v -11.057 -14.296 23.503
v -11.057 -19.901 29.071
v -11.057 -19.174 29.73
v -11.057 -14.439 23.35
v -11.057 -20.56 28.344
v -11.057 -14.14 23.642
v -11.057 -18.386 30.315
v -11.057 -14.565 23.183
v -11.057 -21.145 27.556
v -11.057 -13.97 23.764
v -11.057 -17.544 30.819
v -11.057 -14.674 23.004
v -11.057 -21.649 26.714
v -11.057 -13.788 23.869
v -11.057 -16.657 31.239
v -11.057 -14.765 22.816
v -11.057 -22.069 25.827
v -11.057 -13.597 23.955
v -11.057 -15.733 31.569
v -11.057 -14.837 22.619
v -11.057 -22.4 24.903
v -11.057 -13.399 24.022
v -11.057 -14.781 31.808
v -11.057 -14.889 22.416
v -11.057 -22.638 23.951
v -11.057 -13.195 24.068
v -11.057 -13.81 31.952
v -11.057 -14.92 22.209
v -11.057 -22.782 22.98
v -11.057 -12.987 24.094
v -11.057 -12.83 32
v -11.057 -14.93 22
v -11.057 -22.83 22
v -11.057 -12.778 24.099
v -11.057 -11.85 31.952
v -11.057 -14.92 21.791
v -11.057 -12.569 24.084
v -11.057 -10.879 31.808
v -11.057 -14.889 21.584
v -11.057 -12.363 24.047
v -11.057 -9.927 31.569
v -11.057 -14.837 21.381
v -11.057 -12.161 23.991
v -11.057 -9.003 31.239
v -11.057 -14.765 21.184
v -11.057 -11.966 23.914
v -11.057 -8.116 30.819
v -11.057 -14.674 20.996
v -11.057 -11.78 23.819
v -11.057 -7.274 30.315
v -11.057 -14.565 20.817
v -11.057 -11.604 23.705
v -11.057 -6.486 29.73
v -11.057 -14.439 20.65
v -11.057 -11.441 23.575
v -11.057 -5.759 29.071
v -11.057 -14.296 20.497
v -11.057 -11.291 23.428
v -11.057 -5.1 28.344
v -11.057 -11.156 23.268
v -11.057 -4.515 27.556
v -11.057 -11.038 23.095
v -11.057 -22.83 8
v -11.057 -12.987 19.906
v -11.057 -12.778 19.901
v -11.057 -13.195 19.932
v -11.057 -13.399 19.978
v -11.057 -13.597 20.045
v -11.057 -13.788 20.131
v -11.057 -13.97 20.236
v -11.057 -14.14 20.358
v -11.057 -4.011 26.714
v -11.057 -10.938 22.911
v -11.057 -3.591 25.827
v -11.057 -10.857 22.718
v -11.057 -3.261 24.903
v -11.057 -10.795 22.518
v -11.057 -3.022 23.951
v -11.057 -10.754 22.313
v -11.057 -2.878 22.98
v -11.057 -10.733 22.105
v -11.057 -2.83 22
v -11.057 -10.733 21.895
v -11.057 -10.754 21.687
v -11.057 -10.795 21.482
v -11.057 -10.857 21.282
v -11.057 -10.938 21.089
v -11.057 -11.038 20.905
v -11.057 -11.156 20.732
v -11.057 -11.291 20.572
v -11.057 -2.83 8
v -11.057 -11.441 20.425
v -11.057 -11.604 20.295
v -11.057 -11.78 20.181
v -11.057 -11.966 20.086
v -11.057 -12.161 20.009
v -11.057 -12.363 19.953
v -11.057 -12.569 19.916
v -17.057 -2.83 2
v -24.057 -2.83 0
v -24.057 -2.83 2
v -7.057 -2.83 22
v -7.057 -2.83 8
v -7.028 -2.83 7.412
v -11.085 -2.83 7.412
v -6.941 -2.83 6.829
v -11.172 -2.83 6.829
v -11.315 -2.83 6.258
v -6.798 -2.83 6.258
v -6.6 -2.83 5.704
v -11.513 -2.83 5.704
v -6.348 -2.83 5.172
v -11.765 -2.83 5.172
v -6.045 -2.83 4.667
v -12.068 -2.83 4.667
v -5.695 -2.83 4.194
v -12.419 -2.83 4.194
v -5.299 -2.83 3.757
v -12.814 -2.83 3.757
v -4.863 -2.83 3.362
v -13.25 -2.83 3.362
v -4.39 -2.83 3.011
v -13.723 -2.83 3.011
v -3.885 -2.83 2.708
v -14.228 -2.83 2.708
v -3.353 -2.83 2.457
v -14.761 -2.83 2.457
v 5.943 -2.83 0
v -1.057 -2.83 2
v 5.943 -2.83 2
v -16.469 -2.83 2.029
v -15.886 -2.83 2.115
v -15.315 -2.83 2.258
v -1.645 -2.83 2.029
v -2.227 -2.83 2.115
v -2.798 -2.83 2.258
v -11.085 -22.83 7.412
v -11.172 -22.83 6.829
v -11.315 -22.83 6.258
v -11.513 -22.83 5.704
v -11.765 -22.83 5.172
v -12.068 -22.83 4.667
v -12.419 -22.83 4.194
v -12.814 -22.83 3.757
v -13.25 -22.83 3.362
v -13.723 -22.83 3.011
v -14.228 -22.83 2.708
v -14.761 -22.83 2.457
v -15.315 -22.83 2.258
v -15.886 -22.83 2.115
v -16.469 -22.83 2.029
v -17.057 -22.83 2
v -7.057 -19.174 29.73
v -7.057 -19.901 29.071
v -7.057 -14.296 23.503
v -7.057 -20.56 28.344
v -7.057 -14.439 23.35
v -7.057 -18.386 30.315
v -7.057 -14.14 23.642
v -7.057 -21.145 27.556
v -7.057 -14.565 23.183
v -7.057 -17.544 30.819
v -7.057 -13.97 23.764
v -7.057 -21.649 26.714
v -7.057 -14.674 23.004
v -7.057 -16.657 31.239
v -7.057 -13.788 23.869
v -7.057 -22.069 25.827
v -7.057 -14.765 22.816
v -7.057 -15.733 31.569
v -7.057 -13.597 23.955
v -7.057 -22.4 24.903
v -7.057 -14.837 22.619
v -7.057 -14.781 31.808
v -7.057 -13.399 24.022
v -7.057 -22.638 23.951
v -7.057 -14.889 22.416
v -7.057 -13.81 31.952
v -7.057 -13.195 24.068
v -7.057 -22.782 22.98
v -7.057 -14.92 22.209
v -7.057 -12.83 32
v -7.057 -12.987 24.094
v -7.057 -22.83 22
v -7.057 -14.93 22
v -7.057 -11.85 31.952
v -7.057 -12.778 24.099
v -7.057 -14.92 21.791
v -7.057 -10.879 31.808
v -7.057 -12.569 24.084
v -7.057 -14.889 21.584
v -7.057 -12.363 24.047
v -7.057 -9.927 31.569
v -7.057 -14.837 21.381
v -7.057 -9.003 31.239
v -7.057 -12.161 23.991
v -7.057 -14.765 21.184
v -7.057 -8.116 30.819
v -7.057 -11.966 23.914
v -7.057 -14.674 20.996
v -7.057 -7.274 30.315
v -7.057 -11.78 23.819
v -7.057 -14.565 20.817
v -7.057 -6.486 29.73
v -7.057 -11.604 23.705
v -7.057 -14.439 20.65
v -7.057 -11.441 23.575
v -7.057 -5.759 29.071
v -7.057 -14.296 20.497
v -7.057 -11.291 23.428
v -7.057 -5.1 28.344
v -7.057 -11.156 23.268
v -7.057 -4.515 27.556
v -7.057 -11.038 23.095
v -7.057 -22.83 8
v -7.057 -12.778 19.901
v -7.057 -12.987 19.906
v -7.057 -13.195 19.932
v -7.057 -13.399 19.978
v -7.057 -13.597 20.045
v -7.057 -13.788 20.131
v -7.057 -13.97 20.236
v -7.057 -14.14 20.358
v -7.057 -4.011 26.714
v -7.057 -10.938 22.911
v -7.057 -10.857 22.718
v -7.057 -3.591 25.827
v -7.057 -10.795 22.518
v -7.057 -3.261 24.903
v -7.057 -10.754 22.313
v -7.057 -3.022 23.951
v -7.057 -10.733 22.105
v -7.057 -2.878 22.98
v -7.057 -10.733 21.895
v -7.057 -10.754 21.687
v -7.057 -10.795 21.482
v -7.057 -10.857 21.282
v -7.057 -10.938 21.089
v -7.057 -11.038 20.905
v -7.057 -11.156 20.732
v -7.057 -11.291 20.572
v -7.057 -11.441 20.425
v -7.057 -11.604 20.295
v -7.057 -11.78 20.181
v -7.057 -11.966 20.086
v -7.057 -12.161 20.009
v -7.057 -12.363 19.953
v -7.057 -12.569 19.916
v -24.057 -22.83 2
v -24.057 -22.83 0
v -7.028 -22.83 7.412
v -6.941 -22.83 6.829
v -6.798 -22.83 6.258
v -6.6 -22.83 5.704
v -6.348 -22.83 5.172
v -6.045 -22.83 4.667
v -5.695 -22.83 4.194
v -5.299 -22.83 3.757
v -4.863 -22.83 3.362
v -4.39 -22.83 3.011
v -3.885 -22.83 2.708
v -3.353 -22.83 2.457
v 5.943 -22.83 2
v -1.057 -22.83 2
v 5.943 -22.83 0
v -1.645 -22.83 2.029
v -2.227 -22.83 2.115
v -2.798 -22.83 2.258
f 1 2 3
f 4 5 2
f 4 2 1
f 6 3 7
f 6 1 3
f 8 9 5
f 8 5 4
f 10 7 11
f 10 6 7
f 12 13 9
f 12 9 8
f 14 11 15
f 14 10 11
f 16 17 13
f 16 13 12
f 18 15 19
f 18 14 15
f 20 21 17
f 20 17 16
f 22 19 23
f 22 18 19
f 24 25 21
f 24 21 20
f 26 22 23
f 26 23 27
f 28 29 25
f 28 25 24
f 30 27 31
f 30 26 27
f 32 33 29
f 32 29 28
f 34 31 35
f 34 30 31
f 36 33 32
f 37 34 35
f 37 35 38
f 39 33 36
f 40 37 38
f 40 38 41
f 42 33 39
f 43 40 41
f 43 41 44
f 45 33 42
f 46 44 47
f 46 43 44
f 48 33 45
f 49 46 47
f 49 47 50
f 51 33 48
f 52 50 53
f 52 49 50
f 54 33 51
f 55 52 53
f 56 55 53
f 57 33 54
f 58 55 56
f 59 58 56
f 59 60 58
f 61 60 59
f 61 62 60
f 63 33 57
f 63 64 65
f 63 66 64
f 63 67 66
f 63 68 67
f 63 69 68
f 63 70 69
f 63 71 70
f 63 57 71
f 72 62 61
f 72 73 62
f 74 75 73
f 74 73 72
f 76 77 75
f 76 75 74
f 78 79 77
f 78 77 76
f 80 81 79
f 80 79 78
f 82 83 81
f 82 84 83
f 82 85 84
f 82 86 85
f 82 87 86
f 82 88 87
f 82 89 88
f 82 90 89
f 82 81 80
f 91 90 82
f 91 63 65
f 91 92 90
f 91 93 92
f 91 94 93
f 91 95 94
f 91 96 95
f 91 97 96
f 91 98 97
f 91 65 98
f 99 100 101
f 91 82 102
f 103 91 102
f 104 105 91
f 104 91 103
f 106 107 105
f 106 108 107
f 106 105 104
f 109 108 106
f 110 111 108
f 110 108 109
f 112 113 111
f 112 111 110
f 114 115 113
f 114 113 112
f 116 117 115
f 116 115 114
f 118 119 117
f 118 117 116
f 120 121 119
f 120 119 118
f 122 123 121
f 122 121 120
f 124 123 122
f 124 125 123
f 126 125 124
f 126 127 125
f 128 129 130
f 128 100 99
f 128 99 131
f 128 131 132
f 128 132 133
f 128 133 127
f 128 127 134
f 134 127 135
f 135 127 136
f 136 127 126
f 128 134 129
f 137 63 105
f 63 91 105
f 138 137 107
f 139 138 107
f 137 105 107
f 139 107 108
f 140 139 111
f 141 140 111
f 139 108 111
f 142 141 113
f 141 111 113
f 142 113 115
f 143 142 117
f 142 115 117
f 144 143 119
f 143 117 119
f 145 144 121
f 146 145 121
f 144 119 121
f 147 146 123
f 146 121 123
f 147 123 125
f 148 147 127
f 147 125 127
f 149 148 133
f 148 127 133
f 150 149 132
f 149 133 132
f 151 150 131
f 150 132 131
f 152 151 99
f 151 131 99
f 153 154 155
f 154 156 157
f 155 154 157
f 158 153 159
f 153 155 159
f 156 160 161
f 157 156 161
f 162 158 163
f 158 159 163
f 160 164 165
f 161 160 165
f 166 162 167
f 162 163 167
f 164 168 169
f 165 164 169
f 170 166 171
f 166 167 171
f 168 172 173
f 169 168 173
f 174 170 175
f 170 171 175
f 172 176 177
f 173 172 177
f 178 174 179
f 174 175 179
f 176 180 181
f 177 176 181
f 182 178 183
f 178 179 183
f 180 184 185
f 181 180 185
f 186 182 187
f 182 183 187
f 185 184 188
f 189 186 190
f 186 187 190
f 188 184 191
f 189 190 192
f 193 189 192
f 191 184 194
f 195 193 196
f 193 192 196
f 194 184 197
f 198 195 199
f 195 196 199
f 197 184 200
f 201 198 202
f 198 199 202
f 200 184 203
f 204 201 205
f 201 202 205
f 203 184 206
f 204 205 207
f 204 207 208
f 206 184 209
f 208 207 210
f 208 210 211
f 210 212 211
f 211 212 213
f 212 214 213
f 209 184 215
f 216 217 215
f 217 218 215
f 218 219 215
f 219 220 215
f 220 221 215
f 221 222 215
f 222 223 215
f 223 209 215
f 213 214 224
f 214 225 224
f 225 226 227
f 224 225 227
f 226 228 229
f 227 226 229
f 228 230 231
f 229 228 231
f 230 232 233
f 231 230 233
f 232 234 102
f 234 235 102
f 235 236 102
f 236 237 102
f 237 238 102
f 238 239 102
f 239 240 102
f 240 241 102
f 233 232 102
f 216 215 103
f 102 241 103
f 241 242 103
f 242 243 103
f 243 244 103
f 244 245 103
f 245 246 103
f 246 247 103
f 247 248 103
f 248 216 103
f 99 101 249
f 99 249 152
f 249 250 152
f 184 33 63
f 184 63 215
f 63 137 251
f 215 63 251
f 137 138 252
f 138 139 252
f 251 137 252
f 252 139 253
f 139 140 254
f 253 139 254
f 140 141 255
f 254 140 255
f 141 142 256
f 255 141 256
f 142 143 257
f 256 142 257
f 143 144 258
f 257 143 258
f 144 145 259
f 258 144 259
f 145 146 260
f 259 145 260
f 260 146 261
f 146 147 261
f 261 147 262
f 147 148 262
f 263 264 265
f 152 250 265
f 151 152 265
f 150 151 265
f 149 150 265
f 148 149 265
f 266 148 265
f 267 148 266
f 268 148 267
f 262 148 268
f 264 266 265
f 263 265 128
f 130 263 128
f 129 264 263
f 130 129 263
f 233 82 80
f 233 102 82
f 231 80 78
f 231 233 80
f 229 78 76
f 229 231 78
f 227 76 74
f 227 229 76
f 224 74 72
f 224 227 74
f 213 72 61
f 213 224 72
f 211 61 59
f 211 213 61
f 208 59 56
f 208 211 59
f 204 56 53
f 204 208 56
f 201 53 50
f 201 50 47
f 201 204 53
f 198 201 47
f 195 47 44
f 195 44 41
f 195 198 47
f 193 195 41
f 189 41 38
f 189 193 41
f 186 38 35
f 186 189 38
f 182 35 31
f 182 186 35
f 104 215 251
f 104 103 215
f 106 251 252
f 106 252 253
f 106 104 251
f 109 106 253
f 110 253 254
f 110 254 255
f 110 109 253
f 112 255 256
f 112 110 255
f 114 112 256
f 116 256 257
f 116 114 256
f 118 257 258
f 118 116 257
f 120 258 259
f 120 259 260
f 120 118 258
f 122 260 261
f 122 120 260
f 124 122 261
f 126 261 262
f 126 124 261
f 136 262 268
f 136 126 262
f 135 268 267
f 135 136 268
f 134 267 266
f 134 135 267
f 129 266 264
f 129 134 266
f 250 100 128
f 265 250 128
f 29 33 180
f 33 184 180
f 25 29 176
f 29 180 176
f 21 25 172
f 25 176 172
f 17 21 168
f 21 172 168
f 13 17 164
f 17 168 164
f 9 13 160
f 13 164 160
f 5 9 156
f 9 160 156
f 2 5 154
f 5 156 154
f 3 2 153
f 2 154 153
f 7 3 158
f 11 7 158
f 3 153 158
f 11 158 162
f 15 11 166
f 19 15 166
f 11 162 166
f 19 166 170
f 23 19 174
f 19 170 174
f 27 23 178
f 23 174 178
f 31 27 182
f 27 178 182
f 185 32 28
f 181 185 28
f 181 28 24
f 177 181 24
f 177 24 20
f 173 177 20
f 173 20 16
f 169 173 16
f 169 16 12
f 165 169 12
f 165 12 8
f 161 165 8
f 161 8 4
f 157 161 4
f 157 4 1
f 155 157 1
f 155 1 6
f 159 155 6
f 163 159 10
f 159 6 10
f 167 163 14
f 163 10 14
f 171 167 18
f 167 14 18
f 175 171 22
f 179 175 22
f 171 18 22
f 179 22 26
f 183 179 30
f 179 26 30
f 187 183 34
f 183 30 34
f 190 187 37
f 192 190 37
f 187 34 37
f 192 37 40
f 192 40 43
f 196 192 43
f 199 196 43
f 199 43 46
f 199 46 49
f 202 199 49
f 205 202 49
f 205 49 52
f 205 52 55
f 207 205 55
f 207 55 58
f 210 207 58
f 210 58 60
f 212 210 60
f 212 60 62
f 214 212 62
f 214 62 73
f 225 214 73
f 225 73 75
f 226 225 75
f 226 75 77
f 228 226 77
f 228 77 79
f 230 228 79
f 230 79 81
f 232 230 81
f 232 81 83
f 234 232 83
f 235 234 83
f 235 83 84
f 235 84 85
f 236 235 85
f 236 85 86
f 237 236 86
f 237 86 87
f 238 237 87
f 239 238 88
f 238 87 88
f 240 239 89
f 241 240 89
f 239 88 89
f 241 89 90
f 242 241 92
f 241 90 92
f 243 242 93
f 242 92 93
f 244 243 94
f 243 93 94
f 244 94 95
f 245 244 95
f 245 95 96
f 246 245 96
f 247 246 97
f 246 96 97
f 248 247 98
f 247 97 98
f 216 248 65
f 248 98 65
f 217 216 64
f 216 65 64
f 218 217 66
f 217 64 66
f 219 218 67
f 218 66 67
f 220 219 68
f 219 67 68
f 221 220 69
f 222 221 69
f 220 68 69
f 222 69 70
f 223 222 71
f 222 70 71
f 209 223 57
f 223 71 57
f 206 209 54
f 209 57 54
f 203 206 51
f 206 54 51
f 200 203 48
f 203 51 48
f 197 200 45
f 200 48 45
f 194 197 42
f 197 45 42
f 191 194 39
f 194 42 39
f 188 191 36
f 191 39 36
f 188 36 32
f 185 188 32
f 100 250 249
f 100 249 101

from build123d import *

# Parameters (mm, degrees)
SKETCH_4_W          = 30
SKETCH_4_H          = 20
EXTRUDE_1_DEPTH     = 2
SKETCH_5_W          = 4
SKETCH_5_H          = 20
EXTRUDE_2_DEPTH     = 30
FILLET_1_R          = 10
SKETCH_6_R          = 2.1
CUT_EXTRUDE_2_DEPTH = 30
FILLET_2_R          = 6


with BuildPart() as part:
    # 草图4 → 凸台-拉伸1 (new body)
    with BuildSketch(Plane.XY):
        with Locations((-9.056603774, -12.830188679)):
            Rectangle(SKETCH_4_W, SKETCH_4_H)
    extrude(amount=EXTRUDE_1_DEPTH)

    # 草图5 → 凸台-拉伸2 (add)
    with BuildSketch(Plane.XY.offset(2)):
        with Locations((-9.056603774, -12.830188679)):
            Rectangle(SKETCH_5_W, SKETCH_5_H)
    extrude(amount=EXTRUDE_2_DEPTH)

    # 圆角1
    fillet_1_edges = [part.edges().sort_by_distance(p)[0] for p in [
        (-9.056603774, -2.830188679, 32),
        (-9.056603774, -22.830188679, 32),
    ]]
    fillet(fillet_1_edges, radius=FILLET_1_R - 0.0001)  # a hair under: the kernel refuses the full size

    # 草图6 → 切除-拉伸2 (cut)
    with BuildSketch(Plane.ZY.offset(11.056603774)):
        with Locations(Location((22, -12.830188679, 0), (0, 0, 270))):
            Circle(SKETCH_6_R)
    extrude(amount=-CUT_EXTRUDE_2_DEPTH, mode=Mode.SUBTRACT)

    # 圆角2
    fillet_2_edges = [part.edges().sort_by_distance(p)[0] for p in [
        (-11.056603774, -12.830188679, 2),
        (-7.056603774, -12.830188679, 2),
    ]]
    fillet(fillet_2_edges, radius=FILLET_2_R)


solid = part.part
